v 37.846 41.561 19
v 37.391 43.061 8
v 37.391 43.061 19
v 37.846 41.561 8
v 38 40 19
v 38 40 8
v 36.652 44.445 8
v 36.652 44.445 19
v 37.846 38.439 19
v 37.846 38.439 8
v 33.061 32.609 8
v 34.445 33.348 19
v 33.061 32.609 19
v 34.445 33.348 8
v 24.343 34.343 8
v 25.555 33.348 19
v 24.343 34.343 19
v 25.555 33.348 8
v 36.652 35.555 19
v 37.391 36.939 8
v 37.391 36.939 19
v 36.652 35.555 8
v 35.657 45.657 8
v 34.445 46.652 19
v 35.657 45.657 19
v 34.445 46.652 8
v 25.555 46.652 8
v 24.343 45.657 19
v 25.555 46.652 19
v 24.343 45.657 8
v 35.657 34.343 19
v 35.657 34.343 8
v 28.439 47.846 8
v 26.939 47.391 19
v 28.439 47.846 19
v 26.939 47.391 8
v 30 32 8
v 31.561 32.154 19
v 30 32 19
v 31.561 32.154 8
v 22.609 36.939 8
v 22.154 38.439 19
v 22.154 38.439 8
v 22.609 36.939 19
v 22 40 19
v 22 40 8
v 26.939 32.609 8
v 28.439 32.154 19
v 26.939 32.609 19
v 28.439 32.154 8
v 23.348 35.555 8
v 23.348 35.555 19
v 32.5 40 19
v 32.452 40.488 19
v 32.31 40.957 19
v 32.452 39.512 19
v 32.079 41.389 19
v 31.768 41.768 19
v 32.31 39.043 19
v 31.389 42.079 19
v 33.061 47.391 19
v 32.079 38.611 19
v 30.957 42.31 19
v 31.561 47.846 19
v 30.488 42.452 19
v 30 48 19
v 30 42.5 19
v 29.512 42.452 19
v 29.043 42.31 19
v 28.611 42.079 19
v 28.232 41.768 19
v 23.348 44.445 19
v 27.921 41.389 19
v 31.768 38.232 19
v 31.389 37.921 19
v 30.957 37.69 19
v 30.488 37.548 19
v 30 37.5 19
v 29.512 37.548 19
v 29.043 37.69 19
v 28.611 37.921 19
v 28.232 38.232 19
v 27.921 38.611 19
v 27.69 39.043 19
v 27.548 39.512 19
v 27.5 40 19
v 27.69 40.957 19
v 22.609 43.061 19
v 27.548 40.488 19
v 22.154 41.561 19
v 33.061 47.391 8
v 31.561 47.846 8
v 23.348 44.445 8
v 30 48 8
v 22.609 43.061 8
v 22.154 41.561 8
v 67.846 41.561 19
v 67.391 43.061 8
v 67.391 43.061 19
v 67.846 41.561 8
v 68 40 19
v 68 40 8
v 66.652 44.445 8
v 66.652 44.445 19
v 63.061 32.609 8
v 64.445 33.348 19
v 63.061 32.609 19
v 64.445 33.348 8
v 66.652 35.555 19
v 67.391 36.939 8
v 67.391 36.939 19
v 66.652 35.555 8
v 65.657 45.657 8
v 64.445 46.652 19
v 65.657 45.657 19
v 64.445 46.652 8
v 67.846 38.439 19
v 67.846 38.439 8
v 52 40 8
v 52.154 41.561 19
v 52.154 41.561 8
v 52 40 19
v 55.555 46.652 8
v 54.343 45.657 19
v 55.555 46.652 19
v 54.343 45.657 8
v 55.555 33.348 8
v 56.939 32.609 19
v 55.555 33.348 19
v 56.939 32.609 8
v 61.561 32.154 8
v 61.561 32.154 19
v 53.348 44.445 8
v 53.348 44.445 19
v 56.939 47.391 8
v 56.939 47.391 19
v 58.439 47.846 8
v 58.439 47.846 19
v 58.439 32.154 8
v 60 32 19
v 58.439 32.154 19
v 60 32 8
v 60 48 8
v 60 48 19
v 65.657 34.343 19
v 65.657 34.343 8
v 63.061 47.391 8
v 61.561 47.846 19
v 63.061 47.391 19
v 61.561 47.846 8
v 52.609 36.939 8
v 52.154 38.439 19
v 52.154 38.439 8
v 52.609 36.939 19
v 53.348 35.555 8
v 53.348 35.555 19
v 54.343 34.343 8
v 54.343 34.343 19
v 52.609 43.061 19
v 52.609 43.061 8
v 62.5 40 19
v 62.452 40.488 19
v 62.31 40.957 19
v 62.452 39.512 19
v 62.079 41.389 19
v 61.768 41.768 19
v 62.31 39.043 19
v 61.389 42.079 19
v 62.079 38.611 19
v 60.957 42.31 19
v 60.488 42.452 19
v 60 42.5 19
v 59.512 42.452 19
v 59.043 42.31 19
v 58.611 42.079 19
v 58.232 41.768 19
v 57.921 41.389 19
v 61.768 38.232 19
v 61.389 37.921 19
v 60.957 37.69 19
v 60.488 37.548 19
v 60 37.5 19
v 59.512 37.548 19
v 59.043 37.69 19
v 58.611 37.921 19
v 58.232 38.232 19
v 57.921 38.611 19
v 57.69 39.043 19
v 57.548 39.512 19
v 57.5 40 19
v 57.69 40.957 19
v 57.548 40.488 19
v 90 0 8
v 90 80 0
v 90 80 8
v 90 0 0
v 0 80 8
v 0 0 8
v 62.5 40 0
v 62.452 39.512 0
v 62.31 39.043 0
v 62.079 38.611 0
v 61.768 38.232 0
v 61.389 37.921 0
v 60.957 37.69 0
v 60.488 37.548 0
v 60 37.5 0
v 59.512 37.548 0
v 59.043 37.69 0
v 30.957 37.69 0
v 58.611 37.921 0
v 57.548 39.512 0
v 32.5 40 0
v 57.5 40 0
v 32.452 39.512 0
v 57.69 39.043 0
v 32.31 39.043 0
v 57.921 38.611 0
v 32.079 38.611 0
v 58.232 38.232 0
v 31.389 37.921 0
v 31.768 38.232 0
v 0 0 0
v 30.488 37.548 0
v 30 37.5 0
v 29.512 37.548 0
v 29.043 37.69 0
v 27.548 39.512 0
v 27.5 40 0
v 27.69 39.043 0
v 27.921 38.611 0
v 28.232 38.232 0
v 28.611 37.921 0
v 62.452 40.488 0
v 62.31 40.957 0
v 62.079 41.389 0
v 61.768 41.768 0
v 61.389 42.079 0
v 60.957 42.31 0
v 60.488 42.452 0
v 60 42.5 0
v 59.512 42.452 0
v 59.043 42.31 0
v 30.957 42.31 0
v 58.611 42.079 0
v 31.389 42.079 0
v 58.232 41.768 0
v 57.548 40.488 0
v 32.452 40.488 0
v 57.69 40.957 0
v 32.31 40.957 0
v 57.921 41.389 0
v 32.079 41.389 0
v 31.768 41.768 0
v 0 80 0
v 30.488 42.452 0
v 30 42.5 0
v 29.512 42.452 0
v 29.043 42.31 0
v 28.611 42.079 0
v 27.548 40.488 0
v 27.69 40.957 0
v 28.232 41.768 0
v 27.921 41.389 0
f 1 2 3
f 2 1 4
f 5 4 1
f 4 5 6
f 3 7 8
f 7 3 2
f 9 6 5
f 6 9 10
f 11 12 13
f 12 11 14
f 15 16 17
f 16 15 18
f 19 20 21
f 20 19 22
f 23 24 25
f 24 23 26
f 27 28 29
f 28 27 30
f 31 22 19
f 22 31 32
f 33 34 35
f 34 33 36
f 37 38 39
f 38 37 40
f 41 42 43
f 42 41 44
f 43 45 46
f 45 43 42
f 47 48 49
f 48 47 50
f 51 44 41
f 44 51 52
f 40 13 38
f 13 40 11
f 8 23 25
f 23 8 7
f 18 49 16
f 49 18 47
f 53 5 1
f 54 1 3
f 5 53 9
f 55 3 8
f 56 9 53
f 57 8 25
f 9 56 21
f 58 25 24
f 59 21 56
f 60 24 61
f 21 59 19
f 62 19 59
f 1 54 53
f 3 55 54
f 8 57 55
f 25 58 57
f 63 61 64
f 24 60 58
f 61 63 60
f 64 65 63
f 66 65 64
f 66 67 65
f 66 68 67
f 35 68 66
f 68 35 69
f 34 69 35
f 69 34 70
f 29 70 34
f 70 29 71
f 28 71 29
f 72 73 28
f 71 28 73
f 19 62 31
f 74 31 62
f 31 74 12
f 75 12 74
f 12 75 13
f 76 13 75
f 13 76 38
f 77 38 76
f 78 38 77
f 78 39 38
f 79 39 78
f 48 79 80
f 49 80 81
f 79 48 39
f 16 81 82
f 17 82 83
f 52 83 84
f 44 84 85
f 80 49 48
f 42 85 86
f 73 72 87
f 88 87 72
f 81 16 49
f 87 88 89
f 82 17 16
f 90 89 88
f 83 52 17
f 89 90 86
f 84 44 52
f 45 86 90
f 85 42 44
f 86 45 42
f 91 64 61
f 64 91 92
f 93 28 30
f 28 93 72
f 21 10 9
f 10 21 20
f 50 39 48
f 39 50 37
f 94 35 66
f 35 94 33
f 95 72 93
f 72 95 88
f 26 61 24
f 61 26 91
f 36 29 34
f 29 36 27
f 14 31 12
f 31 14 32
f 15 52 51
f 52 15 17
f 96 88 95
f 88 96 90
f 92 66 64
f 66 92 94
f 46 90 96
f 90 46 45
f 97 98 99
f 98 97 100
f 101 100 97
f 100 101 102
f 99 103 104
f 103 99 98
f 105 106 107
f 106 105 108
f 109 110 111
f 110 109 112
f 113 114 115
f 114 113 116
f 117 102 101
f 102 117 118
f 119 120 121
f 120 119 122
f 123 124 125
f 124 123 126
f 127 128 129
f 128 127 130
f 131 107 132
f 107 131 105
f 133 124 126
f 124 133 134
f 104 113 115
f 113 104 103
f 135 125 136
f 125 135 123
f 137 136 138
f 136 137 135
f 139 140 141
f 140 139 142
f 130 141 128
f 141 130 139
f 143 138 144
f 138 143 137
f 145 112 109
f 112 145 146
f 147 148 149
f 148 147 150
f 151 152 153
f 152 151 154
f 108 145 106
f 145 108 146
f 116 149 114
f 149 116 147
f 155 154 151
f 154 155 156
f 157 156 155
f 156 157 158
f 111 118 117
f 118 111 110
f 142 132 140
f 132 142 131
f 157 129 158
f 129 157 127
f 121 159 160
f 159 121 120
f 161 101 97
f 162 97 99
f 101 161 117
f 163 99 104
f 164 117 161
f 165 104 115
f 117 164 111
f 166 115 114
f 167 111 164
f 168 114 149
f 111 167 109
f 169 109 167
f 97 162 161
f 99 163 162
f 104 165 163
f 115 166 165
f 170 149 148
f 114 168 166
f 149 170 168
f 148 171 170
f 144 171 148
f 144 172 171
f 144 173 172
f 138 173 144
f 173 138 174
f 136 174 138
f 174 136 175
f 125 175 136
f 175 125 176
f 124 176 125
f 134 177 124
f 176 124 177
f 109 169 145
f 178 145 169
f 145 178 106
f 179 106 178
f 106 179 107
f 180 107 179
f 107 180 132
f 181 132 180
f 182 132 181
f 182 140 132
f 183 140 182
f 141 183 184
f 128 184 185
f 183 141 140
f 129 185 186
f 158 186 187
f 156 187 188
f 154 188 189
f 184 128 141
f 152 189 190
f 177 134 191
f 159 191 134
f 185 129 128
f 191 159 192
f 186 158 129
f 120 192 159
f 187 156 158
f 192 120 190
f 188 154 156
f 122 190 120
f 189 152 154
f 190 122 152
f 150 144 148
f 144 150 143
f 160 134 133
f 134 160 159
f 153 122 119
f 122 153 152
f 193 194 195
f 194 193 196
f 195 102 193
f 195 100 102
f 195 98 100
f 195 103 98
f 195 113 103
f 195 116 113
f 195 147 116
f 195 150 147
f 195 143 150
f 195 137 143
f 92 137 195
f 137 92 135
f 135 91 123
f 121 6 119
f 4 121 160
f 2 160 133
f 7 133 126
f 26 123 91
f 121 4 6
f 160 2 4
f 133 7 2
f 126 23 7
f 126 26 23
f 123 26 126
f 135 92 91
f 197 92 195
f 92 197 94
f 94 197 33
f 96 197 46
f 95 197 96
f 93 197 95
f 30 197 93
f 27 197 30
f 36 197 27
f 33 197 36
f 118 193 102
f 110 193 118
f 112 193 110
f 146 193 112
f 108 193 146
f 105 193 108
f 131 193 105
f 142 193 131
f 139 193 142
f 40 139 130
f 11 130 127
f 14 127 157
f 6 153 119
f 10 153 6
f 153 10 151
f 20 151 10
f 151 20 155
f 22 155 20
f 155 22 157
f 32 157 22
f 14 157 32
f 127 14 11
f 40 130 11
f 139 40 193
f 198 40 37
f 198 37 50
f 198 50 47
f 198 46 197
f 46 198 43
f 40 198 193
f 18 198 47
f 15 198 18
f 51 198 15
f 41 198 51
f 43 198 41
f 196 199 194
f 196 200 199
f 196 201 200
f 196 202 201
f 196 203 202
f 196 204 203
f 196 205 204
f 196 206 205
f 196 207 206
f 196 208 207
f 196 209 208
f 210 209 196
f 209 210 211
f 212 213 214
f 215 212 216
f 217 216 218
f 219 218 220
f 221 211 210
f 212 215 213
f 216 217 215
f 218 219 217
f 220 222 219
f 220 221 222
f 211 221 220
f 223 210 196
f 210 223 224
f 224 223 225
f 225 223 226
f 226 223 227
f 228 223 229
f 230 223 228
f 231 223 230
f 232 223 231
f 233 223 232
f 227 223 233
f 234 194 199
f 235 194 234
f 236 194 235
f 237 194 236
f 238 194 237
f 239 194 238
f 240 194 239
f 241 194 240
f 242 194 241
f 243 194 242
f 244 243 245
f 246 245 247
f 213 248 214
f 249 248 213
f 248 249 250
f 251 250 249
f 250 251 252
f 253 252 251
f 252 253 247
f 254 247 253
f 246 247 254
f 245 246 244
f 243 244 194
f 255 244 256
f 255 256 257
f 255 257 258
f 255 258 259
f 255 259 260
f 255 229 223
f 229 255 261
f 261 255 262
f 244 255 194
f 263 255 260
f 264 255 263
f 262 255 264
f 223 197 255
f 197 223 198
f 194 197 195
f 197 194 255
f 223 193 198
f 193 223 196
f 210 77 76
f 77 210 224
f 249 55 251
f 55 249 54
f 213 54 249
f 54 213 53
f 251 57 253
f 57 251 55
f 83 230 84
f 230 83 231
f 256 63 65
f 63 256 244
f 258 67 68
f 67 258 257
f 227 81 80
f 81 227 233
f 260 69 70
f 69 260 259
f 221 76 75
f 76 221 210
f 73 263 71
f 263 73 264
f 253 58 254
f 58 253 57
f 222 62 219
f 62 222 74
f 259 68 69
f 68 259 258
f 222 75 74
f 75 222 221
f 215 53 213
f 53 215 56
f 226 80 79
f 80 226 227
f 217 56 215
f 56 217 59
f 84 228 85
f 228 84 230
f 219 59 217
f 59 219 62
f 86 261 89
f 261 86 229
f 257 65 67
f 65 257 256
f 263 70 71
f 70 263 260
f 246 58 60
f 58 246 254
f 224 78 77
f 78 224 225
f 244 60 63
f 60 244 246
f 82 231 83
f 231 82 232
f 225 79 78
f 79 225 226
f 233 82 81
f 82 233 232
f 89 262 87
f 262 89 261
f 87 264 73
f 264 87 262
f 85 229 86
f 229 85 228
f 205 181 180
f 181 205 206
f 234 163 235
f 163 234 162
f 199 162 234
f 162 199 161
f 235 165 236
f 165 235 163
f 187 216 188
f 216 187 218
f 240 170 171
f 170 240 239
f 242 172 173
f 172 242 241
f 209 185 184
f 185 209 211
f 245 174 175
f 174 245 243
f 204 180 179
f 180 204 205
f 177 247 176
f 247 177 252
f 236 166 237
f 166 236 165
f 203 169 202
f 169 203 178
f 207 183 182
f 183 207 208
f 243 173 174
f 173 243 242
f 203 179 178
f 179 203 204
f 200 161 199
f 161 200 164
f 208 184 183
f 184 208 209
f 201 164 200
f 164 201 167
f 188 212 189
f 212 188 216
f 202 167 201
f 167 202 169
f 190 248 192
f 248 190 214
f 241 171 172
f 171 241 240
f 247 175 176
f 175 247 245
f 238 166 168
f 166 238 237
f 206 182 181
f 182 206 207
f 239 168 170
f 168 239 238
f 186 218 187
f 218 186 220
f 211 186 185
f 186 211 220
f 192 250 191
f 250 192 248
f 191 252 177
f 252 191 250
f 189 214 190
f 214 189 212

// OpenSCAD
$fn = 32;

// ----------------------------------------------------------------------
// Drill jig: two_boss jig
// ----------------------------------------------------------------------

// --- parameters (mm) ---
plate_l = 90;             // plate length, X
plate_w = 80;             // plate width, Y
plate_t = 8;              // plate thickness
boss_d = 16;              // guide boss diameter
boss_h = 12;              // boss height above the plate
guide_d = 5;              // guide hole diameter
boss_pitch = 30;          // boss pitch

n_boss = 2;  // guide bosses
boss_x0 = (plate_l - (n_boss - 1) * boss_pitch) / 2;  // first boss X
boss_top = plate_t - 1 + boss_h;  // boss crown height
total_h = boss_top;  // overall height

difference() {
  union() {
  cube([plate_l, plate_w, plate_t]);
  for (i = [0 : n_boss - 1])
    translate([boss_x0 + i * boss_pitch, plate_w / 2, plate_t - 1])
      cylinder(h = boss_h, d = boss_d);
  }
  for (i = [0 : n_boss - 1])
    translate([boss_x0 + i * boss_pitch, plate_w / 2, -1])
      cylinder(h = plate_t + boss_h, d = guide_d);
}
